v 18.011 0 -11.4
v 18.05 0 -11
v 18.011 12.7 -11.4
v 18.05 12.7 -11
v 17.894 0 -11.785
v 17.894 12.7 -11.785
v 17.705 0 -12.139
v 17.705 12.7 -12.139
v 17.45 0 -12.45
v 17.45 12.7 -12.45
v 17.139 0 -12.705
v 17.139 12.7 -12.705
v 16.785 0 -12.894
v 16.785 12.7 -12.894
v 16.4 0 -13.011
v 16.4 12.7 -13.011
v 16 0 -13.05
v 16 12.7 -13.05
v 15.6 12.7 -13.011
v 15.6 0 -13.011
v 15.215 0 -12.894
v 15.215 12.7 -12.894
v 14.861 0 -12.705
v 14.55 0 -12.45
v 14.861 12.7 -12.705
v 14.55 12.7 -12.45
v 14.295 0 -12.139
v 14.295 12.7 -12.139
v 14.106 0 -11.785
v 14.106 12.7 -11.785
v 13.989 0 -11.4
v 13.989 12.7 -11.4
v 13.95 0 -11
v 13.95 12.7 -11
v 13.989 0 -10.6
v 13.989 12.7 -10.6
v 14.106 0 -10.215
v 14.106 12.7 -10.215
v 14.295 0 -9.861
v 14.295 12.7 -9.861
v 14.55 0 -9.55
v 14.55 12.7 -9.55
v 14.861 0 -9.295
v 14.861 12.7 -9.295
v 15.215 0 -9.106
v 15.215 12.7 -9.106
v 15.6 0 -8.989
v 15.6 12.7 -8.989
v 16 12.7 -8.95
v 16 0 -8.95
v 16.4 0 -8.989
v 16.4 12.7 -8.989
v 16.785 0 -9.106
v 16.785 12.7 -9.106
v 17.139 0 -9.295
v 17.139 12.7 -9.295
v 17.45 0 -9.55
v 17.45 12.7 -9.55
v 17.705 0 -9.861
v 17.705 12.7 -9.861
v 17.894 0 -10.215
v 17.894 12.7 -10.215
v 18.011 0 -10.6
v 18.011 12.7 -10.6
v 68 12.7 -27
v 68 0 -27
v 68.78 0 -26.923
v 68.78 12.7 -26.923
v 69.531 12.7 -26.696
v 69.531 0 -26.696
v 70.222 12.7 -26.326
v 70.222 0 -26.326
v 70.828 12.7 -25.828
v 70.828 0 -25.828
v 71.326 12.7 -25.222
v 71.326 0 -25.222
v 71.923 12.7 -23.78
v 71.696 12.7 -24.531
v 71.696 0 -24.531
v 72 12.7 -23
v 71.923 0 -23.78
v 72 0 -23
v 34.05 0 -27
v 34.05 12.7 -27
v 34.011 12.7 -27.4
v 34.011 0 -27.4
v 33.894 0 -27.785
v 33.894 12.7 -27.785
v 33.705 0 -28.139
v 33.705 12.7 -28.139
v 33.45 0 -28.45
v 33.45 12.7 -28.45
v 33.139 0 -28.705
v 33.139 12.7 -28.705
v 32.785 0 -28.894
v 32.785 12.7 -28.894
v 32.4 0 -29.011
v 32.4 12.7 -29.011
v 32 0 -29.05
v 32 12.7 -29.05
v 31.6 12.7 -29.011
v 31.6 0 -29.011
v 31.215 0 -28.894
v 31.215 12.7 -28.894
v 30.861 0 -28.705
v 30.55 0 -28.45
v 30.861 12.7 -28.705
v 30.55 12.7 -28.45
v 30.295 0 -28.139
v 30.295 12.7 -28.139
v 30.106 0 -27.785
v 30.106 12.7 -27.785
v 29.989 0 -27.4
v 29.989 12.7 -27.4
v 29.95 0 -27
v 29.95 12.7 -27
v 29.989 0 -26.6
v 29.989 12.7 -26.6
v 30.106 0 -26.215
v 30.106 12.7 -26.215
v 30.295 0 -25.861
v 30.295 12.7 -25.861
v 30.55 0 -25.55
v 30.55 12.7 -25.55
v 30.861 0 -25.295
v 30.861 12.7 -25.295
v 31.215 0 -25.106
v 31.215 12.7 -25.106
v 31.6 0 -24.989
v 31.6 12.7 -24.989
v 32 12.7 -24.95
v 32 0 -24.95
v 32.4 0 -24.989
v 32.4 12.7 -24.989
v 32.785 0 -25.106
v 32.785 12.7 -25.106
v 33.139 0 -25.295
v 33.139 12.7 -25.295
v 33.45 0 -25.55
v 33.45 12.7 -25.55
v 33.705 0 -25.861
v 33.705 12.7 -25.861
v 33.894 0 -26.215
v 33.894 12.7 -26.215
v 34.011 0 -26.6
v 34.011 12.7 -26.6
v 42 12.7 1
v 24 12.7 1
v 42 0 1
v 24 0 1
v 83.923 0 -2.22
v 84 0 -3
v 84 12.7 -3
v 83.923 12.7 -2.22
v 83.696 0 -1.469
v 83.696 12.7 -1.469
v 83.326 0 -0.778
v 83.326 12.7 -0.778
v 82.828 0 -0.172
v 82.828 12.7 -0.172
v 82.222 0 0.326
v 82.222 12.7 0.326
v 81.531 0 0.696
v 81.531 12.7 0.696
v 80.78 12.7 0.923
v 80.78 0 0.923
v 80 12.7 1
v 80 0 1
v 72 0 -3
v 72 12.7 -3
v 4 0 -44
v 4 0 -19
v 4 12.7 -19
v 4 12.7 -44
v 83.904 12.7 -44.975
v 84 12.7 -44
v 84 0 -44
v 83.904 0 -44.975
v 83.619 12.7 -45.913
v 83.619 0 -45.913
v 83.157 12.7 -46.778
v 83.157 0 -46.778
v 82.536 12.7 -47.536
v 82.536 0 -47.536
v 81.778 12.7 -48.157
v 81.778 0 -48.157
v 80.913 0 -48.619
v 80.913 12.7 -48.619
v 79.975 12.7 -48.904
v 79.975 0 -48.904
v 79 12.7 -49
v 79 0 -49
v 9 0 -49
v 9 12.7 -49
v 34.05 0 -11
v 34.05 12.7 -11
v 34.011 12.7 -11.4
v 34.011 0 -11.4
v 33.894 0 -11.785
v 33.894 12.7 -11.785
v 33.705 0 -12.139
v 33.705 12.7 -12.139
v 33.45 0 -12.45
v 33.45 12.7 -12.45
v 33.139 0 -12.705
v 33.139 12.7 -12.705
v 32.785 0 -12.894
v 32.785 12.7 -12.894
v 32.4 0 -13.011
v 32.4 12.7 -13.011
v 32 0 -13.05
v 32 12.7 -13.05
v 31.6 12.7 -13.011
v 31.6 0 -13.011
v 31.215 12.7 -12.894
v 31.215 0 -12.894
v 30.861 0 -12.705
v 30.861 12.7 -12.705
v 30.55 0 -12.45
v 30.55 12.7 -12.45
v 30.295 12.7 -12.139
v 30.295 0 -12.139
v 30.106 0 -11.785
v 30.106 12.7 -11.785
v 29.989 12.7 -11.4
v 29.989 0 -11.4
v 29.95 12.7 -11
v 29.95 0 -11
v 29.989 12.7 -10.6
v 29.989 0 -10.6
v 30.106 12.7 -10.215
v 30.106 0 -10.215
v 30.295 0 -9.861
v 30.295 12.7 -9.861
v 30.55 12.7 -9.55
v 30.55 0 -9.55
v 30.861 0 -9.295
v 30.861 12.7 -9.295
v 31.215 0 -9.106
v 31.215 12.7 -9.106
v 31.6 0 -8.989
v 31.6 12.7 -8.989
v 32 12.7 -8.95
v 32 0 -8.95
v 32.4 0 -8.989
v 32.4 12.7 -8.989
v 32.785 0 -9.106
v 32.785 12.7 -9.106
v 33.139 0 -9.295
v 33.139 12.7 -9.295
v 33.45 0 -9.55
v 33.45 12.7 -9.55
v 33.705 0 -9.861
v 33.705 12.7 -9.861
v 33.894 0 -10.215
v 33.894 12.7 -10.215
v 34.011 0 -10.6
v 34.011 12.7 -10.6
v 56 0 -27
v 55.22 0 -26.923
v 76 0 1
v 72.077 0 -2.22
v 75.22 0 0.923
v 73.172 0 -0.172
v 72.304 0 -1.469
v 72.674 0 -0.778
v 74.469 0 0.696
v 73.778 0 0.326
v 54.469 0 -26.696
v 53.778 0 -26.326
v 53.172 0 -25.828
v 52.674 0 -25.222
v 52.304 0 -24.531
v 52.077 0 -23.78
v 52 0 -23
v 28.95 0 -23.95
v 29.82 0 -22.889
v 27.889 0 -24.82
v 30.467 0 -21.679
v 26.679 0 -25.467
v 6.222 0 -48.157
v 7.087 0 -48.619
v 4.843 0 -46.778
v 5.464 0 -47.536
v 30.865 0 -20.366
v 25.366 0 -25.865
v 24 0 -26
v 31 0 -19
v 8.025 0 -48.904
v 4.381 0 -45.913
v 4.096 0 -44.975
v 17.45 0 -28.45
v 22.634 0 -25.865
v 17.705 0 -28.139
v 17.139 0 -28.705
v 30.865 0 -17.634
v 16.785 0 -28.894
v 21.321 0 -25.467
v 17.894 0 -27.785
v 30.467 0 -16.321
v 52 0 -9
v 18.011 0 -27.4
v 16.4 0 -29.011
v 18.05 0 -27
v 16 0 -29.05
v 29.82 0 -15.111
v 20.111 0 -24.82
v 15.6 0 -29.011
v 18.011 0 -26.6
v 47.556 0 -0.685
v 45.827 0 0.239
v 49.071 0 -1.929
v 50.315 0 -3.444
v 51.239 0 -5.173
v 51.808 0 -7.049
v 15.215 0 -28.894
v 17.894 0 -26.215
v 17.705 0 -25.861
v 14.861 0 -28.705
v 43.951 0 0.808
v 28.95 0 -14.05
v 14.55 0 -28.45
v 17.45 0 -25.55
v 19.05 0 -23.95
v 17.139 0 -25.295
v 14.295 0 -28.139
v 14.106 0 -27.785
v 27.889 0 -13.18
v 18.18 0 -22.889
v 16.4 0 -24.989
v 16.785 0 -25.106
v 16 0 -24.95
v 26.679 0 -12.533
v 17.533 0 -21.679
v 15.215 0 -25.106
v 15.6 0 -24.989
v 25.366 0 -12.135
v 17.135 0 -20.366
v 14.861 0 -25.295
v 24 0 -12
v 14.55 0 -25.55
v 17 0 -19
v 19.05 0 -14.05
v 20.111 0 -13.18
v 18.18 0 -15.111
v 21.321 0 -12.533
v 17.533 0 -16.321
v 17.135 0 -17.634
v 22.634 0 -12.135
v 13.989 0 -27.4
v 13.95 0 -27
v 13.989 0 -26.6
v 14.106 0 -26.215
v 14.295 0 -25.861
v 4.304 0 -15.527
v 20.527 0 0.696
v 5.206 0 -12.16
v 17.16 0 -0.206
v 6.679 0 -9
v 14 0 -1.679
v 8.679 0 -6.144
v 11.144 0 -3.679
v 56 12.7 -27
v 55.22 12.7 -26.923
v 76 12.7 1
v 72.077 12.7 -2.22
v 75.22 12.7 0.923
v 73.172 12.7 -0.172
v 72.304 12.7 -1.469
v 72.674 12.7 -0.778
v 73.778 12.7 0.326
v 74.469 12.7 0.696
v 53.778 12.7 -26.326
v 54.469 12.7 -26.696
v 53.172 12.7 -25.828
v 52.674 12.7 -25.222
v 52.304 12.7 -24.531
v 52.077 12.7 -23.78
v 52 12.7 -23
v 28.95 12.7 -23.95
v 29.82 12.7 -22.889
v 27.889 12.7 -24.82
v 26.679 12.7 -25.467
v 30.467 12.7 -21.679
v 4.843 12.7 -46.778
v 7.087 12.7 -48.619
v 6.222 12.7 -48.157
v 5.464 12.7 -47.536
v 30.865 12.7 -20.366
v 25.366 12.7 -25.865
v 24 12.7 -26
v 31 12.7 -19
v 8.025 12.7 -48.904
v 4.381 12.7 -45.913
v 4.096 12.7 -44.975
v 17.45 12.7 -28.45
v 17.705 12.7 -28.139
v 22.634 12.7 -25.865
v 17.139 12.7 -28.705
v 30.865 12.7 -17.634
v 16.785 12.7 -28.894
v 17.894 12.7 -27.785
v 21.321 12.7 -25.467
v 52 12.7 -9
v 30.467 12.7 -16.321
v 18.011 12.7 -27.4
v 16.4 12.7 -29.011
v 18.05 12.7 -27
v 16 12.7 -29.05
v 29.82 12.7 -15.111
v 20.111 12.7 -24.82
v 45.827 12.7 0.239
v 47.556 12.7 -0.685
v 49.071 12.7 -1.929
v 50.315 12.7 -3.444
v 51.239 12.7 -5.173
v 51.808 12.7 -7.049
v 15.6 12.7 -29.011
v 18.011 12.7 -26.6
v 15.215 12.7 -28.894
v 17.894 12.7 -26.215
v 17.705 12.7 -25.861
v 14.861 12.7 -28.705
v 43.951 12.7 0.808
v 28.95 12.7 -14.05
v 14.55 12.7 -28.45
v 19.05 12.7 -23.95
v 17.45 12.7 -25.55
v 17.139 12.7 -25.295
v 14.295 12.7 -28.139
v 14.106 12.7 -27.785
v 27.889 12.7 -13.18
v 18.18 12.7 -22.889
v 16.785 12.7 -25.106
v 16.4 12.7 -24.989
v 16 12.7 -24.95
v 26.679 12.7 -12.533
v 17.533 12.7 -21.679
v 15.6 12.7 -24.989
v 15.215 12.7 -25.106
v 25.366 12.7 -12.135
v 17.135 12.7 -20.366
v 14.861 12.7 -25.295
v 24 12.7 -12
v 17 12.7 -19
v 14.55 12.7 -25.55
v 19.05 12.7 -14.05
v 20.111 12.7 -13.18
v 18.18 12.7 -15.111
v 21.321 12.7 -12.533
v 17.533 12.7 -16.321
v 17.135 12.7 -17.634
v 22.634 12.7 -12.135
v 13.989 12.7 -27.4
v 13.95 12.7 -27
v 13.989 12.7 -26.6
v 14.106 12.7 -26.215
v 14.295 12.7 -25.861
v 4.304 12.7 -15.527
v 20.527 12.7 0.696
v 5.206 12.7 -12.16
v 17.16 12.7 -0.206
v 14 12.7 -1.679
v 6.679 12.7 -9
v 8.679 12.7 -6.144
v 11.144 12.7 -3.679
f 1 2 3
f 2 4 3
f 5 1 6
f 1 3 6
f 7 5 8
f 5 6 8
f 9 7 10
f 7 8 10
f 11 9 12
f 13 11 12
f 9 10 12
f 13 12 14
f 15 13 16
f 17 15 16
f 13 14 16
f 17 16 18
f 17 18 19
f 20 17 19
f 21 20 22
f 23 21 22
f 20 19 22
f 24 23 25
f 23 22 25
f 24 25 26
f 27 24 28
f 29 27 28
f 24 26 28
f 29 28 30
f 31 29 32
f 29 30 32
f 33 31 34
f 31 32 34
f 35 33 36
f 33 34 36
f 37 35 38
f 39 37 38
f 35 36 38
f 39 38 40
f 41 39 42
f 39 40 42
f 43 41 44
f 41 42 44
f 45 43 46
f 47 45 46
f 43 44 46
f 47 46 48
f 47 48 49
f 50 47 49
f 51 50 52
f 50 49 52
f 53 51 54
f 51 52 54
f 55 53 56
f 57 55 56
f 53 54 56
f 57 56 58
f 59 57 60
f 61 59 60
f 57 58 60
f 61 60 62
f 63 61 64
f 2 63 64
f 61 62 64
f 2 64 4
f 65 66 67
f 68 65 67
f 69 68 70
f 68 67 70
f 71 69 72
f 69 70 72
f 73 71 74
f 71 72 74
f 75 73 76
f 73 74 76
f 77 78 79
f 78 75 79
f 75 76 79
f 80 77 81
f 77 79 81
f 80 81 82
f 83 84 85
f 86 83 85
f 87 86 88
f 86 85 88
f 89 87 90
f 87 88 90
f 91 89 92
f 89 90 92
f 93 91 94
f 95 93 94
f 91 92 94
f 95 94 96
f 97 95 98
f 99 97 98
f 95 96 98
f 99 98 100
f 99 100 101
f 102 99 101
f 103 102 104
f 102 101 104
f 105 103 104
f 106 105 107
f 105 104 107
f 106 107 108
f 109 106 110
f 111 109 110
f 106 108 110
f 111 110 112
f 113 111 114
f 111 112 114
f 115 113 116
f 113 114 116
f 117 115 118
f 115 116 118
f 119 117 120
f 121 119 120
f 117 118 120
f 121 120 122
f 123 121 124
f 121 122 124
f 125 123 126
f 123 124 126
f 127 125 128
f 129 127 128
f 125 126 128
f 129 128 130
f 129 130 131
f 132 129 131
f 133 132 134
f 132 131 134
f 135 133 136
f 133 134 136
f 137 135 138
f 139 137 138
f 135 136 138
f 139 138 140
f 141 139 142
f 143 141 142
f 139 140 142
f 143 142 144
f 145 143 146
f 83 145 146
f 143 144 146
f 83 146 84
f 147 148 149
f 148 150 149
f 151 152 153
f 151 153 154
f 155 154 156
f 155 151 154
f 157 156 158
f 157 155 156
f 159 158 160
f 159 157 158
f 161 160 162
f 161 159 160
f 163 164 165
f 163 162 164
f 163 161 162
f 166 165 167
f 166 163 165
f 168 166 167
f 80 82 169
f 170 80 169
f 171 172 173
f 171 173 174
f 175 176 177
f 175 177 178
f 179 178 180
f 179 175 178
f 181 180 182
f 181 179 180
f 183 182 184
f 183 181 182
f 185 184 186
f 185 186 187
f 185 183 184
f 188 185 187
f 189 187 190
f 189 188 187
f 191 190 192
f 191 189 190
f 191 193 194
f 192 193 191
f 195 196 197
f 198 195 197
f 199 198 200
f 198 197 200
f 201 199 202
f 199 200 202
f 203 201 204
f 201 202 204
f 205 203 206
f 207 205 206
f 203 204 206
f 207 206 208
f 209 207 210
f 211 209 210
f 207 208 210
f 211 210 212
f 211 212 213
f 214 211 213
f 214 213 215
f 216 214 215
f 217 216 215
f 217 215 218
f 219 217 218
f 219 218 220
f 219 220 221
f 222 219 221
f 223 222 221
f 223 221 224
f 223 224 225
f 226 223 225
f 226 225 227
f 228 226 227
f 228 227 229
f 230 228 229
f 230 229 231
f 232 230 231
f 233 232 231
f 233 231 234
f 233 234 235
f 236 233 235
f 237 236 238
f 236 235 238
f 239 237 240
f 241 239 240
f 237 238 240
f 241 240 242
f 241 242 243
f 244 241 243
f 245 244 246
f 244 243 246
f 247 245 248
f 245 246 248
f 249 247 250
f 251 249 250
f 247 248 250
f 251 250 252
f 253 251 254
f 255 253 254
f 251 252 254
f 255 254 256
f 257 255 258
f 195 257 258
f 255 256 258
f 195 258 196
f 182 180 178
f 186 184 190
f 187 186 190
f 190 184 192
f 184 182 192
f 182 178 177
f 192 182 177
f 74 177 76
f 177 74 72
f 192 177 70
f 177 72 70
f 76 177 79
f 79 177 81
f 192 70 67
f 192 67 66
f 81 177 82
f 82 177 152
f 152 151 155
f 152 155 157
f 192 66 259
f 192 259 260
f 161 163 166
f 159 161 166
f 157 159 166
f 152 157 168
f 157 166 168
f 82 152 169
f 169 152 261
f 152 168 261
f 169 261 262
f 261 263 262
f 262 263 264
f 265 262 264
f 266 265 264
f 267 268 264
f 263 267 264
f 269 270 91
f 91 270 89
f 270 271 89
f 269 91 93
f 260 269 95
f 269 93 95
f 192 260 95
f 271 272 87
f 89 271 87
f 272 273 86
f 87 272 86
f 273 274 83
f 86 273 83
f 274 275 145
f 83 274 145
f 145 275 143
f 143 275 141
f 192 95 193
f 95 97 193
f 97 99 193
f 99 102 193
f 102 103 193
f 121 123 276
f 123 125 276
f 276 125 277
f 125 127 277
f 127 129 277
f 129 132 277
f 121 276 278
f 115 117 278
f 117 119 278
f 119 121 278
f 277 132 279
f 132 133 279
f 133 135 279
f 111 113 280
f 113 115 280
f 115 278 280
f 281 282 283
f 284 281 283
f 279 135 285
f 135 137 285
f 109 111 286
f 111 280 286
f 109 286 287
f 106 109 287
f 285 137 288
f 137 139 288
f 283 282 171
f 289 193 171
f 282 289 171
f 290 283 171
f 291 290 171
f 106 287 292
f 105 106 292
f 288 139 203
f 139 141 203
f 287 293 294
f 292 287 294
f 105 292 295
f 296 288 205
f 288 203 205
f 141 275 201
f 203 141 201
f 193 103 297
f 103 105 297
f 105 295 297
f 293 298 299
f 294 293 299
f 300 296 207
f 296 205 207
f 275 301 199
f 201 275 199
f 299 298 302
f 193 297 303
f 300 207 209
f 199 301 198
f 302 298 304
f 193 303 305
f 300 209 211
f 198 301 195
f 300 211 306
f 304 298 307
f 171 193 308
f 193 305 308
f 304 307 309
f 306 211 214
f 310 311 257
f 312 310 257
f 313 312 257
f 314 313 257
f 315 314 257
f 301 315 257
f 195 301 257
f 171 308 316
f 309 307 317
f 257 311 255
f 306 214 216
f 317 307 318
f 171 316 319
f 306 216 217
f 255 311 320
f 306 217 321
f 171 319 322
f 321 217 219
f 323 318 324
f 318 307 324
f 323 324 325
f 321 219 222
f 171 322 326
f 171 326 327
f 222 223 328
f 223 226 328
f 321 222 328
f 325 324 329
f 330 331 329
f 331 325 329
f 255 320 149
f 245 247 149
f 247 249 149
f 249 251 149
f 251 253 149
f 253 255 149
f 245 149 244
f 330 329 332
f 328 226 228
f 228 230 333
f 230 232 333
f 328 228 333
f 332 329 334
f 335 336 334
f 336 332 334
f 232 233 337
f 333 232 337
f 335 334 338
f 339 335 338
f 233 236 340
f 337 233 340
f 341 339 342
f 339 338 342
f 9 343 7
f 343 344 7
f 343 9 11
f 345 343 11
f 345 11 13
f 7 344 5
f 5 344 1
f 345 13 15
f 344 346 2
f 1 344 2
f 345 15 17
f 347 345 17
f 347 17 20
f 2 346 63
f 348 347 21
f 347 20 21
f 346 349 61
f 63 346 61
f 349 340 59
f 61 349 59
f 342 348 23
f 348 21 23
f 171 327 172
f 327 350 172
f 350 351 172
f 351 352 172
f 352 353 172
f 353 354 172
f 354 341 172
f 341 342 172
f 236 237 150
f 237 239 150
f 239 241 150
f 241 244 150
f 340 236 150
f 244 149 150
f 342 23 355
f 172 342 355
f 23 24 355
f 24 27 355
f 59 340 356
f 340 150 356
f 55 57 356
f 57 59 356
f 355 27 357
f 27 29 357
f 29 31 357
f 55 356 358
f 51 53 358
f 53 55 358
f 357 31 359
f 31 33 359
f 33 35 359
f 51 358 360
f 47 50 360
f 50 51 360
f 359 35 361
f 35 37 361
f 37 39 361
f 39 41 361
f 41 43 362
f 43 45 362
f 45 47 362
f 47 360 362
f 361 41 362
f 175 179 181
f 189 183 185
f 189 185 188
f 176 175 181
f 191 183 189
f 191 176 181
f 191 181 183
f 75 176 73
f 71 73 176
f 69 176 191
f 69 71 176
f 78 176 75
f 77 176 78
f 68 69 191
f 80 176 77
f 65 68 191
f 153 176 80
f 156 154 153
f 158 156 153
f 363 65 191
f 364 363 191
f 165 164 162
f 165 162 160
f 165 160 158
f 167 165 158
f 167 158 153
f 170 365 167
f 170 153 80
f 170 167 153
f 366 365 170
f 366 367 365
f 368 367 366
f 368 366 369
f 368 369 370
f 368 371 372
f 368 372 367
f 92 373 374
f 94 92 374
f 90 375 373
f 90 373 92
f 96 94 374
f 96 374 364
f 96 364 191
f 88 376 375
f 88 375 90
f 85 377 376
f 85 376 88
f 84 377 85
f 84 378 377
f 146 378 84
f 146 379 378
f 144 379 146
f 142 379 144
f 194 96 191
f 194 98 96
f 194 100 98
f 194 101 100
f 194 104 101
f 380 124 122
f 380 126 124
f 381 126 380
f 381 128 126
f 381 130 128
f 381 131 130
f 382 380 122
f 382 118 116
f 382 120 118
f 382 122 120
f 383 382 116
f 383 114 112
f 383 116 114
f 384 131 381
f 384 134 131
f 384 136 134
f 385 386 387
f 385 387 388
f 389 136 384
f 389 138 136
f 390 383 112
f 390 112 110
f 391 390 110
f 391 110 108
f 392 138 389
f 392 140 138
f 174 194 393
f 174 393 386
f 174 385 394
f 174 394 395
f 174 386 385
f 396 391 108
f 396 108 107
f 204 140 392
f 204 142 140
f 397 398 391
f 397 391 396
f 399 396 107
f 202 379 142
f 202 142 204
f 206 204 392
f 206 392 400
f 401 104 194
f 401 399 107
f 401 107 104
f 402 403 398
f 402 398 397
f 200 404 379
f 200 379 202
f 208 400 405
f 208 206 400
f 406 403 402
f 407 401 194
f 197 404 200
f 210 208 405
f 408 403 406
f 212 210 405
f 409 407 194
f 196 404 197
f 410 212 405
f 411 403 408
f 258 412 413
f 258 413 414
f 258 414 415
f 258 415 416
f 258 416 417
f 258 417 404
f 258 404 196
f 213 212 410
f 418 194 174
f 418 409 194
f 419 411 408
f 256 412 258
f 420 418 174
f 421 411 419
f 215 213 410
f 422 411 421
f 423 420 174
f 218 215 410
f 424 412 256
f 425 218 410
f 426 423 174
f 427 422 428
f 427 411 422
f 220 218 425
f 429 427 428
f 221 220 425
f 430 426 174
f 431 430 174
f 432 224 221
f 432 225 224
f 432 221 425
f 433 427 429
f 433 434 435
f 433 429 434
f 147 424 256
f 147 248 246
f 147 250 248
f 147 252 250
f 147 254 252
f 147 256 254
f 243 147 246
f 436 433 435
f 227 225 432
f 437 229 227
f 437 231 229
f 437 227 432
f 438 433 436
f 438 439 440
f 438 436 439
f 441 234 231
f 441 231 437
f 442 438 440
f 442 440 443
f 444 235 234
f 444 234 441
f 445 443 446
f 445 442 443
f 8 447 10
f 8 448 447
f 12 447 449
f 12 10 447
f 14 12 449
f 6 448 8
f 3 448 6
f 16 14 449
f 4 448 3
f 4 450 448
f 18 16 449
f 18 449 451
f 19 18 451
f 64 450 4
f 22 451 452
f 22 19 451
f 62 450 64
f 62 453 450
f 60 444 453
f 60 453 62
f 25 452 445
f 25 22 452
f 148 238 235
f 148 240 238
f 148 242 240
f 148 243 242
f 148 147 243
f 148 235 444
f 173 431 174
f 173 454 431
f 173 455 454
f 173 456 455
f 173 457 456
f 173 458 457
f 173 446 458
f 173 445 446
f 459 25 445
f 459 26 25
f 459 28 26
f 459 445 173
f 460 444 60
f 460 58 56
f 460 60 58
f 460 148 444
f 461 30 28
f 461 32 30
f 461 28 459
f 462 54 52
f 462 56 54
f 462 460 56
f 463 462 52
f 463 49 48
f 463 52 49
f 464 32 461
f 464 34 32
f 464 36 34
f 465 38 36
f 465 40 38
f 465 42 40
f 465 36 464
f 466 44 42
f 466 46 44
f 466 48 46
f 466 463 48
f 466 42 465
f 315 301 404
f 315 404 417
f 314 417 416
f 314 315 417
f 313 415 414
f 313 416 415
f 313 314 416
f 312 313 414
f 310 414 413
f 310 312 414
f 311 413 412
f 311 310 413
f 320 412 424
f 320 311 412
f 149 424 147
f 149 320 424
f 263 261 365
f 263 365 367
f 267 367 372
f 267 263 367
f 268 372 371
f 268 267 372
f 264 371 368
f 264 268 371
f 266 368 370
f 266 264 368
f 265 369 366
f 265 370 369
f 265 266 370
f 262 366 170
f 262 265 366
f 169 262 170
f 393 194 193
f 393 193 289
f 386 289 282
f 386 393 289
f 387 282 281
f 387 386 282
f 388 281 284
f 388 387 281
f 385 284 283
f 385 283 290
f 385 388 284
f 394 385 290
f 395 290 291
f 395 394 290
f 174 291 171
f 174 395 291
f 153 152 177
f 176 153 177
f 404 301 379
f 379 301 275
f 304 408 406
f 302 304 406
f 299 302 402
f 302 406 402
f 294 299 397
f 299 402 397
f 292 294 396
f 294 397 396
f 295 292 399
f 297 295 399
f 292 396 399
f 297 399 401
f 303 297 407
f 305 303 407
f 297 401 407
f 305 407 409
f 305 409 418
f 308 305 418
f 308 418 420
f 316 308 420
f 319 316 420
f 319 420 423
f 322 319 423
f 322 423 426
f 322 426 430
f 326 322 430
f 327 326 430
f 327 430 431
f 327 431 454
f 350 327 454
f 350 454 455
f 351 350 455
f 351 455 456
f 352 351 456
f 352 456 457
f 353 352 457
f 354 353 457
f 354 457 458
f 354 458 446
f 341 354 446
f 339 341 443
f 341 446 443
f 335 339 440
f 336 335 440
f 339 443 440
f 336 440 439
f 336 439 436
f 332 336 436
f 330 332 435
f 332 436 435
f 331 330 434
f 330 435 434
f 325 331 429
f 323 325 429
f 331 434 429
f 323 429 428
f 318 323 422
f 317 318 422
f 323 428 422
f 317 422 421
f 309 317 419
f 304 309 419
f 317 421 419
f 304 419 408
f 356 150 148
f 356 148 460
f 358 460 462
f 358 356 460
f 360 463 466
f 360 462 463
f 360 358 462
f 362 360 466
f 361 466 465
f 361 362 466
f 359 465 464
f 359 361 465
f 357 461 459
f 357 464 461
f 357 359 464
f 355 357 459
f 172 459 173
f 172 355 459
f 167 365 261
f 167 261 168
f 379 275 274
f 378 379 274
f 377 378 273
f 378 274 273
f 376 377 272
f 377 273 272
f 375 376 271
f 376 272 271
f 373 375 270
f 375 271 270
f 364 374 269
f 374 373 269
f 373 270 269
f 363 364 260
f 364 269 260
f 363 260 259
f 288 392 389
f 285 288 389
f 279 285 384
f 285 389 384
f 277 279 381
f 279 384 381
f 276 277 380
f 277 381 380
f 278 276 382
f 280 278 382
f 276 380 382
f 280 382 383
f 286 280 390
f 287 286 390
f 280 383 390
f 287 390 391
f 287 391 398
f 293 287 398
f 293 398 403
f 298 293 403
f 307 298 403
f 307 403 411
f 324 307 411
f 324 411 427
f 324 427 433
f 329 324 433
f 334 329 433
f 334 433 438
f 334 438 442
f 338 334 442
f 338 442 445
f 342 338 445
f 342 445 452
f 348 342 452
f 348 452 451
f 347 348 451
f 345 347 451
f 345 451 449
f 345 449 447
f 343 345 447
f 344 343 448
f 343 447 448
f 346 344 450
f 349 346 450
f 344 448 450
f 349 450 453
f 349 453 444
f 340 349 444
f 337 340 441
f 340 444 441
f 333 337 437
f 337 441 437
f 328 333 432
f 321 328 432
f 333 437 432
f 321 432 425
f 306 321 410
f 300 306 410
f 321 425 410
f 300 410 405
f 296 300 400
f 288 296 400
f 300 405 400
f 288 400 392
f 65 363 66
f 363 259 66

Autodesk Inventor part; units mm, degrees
ref_plane "YZ Plane" through (0, 0, 0) normal (1, 0, 0) x (0, 1, 0)
ref_plane "XZ Plane" through (0, 0, 0) normal (0, 1, 0) x (-1, 0, 0)
ref_plane "XY Plane" through (0, 0, 0) normal (0, 0, 1) x (1, 0, 0)
sketch "Sketch1" plane through (0, 0, 0) normal (0, 1, 0) x (-1, 0, 0)
  line L0 (-84, -3) -> (-84, -35)
  line L1 (-80, -39) -> (-24, -39)
  line L2 (-52, -9) -> (-52, -23)
  line L3 (-56, -27) -> (-68, -27)
  line L4 (-72, -23) -> (-72, -3)
  line L5 (-24, 1) -> (-42, 1)
  line L6 (-76, 1) -> (-80, 1)
  arc A0 (-80, 1) -> (-84, -3) centre (-80, -3) ccw
  arc A1 (-72, -3) -> (-76, 1) centre (-76, -3) ccw
  arc A2 (-84, -35) -> (-80, -39) centre (-80, -35) ccw
  arc A3 (-72, -23) -> (-68, -27) centre (-68, -23) ccw
  arc A4 (-56, -27) -> (-52, -23) centre (-56, -23) ccw
  arc A5 (-24, -39) -> (-24, 1) centre (-24, -19) ccw
  arc A6 (-42, 1) -> (-52, -9) centre (-42, -9) ccw
  line L7 (-4, -19) -> (-4, -49)
  line L8 (-4, -49) -> (-84, -49)
  line L9 (-84, -49) -> (-84, -35)
  point P0 (-84, -39)
  point P1 (-52, -27)
  point P2 (-52, 1)
  point P3 (-72, -27)
  dimension "d2" = 20
  dimension "d4" = 12
  dimension "d6" = 40
  dimension "d9" = 40
  dimension "d24" = 4
  dimension "d25" = 10
  dimension "d26" = 28
  dimension "d27" = 12
  dimension "d32" = 30
extrude "Extrusion1" add sketch "Sketch1" along normal blind 12.7
sketch "Sketch2" plane through (0, 12.7, 0) normal (0, 1, 0) x (1, 0, 0)
  circle A0 centre (24, 19) radius 7
  arc A1 (4, 19) -> (24, -1) centre (24, 19) ccw projected
  circle A2 centre (32, 27) radius 2.05
  circle A3 centre (16, 27) radius 2.05
  circle A4 centre (16, 11) radius 2.05
  circle A5 centre (32, 11) radius 2.05
  point P0 (0, 0)
  point P1 (24, 39)
  dimension "d13" = 14
  dimension "d14" = 4.1
  dimension "d15" = 4.1
  dimension "d16" = 4.1
  dimension "d17" = 4.1
  dimension "d18" = 16
  dimension "d19" = 16
  dimension "d20" = 8
  dimension "d21" = 8
extrude "Extrusion2" cut sketch "Sketch2" against normal through all
fillet "Fillet1" radius 5 2 edges at (84, 6.35, -49) (4, 6.35, -49)
properties part number "platform hook"
